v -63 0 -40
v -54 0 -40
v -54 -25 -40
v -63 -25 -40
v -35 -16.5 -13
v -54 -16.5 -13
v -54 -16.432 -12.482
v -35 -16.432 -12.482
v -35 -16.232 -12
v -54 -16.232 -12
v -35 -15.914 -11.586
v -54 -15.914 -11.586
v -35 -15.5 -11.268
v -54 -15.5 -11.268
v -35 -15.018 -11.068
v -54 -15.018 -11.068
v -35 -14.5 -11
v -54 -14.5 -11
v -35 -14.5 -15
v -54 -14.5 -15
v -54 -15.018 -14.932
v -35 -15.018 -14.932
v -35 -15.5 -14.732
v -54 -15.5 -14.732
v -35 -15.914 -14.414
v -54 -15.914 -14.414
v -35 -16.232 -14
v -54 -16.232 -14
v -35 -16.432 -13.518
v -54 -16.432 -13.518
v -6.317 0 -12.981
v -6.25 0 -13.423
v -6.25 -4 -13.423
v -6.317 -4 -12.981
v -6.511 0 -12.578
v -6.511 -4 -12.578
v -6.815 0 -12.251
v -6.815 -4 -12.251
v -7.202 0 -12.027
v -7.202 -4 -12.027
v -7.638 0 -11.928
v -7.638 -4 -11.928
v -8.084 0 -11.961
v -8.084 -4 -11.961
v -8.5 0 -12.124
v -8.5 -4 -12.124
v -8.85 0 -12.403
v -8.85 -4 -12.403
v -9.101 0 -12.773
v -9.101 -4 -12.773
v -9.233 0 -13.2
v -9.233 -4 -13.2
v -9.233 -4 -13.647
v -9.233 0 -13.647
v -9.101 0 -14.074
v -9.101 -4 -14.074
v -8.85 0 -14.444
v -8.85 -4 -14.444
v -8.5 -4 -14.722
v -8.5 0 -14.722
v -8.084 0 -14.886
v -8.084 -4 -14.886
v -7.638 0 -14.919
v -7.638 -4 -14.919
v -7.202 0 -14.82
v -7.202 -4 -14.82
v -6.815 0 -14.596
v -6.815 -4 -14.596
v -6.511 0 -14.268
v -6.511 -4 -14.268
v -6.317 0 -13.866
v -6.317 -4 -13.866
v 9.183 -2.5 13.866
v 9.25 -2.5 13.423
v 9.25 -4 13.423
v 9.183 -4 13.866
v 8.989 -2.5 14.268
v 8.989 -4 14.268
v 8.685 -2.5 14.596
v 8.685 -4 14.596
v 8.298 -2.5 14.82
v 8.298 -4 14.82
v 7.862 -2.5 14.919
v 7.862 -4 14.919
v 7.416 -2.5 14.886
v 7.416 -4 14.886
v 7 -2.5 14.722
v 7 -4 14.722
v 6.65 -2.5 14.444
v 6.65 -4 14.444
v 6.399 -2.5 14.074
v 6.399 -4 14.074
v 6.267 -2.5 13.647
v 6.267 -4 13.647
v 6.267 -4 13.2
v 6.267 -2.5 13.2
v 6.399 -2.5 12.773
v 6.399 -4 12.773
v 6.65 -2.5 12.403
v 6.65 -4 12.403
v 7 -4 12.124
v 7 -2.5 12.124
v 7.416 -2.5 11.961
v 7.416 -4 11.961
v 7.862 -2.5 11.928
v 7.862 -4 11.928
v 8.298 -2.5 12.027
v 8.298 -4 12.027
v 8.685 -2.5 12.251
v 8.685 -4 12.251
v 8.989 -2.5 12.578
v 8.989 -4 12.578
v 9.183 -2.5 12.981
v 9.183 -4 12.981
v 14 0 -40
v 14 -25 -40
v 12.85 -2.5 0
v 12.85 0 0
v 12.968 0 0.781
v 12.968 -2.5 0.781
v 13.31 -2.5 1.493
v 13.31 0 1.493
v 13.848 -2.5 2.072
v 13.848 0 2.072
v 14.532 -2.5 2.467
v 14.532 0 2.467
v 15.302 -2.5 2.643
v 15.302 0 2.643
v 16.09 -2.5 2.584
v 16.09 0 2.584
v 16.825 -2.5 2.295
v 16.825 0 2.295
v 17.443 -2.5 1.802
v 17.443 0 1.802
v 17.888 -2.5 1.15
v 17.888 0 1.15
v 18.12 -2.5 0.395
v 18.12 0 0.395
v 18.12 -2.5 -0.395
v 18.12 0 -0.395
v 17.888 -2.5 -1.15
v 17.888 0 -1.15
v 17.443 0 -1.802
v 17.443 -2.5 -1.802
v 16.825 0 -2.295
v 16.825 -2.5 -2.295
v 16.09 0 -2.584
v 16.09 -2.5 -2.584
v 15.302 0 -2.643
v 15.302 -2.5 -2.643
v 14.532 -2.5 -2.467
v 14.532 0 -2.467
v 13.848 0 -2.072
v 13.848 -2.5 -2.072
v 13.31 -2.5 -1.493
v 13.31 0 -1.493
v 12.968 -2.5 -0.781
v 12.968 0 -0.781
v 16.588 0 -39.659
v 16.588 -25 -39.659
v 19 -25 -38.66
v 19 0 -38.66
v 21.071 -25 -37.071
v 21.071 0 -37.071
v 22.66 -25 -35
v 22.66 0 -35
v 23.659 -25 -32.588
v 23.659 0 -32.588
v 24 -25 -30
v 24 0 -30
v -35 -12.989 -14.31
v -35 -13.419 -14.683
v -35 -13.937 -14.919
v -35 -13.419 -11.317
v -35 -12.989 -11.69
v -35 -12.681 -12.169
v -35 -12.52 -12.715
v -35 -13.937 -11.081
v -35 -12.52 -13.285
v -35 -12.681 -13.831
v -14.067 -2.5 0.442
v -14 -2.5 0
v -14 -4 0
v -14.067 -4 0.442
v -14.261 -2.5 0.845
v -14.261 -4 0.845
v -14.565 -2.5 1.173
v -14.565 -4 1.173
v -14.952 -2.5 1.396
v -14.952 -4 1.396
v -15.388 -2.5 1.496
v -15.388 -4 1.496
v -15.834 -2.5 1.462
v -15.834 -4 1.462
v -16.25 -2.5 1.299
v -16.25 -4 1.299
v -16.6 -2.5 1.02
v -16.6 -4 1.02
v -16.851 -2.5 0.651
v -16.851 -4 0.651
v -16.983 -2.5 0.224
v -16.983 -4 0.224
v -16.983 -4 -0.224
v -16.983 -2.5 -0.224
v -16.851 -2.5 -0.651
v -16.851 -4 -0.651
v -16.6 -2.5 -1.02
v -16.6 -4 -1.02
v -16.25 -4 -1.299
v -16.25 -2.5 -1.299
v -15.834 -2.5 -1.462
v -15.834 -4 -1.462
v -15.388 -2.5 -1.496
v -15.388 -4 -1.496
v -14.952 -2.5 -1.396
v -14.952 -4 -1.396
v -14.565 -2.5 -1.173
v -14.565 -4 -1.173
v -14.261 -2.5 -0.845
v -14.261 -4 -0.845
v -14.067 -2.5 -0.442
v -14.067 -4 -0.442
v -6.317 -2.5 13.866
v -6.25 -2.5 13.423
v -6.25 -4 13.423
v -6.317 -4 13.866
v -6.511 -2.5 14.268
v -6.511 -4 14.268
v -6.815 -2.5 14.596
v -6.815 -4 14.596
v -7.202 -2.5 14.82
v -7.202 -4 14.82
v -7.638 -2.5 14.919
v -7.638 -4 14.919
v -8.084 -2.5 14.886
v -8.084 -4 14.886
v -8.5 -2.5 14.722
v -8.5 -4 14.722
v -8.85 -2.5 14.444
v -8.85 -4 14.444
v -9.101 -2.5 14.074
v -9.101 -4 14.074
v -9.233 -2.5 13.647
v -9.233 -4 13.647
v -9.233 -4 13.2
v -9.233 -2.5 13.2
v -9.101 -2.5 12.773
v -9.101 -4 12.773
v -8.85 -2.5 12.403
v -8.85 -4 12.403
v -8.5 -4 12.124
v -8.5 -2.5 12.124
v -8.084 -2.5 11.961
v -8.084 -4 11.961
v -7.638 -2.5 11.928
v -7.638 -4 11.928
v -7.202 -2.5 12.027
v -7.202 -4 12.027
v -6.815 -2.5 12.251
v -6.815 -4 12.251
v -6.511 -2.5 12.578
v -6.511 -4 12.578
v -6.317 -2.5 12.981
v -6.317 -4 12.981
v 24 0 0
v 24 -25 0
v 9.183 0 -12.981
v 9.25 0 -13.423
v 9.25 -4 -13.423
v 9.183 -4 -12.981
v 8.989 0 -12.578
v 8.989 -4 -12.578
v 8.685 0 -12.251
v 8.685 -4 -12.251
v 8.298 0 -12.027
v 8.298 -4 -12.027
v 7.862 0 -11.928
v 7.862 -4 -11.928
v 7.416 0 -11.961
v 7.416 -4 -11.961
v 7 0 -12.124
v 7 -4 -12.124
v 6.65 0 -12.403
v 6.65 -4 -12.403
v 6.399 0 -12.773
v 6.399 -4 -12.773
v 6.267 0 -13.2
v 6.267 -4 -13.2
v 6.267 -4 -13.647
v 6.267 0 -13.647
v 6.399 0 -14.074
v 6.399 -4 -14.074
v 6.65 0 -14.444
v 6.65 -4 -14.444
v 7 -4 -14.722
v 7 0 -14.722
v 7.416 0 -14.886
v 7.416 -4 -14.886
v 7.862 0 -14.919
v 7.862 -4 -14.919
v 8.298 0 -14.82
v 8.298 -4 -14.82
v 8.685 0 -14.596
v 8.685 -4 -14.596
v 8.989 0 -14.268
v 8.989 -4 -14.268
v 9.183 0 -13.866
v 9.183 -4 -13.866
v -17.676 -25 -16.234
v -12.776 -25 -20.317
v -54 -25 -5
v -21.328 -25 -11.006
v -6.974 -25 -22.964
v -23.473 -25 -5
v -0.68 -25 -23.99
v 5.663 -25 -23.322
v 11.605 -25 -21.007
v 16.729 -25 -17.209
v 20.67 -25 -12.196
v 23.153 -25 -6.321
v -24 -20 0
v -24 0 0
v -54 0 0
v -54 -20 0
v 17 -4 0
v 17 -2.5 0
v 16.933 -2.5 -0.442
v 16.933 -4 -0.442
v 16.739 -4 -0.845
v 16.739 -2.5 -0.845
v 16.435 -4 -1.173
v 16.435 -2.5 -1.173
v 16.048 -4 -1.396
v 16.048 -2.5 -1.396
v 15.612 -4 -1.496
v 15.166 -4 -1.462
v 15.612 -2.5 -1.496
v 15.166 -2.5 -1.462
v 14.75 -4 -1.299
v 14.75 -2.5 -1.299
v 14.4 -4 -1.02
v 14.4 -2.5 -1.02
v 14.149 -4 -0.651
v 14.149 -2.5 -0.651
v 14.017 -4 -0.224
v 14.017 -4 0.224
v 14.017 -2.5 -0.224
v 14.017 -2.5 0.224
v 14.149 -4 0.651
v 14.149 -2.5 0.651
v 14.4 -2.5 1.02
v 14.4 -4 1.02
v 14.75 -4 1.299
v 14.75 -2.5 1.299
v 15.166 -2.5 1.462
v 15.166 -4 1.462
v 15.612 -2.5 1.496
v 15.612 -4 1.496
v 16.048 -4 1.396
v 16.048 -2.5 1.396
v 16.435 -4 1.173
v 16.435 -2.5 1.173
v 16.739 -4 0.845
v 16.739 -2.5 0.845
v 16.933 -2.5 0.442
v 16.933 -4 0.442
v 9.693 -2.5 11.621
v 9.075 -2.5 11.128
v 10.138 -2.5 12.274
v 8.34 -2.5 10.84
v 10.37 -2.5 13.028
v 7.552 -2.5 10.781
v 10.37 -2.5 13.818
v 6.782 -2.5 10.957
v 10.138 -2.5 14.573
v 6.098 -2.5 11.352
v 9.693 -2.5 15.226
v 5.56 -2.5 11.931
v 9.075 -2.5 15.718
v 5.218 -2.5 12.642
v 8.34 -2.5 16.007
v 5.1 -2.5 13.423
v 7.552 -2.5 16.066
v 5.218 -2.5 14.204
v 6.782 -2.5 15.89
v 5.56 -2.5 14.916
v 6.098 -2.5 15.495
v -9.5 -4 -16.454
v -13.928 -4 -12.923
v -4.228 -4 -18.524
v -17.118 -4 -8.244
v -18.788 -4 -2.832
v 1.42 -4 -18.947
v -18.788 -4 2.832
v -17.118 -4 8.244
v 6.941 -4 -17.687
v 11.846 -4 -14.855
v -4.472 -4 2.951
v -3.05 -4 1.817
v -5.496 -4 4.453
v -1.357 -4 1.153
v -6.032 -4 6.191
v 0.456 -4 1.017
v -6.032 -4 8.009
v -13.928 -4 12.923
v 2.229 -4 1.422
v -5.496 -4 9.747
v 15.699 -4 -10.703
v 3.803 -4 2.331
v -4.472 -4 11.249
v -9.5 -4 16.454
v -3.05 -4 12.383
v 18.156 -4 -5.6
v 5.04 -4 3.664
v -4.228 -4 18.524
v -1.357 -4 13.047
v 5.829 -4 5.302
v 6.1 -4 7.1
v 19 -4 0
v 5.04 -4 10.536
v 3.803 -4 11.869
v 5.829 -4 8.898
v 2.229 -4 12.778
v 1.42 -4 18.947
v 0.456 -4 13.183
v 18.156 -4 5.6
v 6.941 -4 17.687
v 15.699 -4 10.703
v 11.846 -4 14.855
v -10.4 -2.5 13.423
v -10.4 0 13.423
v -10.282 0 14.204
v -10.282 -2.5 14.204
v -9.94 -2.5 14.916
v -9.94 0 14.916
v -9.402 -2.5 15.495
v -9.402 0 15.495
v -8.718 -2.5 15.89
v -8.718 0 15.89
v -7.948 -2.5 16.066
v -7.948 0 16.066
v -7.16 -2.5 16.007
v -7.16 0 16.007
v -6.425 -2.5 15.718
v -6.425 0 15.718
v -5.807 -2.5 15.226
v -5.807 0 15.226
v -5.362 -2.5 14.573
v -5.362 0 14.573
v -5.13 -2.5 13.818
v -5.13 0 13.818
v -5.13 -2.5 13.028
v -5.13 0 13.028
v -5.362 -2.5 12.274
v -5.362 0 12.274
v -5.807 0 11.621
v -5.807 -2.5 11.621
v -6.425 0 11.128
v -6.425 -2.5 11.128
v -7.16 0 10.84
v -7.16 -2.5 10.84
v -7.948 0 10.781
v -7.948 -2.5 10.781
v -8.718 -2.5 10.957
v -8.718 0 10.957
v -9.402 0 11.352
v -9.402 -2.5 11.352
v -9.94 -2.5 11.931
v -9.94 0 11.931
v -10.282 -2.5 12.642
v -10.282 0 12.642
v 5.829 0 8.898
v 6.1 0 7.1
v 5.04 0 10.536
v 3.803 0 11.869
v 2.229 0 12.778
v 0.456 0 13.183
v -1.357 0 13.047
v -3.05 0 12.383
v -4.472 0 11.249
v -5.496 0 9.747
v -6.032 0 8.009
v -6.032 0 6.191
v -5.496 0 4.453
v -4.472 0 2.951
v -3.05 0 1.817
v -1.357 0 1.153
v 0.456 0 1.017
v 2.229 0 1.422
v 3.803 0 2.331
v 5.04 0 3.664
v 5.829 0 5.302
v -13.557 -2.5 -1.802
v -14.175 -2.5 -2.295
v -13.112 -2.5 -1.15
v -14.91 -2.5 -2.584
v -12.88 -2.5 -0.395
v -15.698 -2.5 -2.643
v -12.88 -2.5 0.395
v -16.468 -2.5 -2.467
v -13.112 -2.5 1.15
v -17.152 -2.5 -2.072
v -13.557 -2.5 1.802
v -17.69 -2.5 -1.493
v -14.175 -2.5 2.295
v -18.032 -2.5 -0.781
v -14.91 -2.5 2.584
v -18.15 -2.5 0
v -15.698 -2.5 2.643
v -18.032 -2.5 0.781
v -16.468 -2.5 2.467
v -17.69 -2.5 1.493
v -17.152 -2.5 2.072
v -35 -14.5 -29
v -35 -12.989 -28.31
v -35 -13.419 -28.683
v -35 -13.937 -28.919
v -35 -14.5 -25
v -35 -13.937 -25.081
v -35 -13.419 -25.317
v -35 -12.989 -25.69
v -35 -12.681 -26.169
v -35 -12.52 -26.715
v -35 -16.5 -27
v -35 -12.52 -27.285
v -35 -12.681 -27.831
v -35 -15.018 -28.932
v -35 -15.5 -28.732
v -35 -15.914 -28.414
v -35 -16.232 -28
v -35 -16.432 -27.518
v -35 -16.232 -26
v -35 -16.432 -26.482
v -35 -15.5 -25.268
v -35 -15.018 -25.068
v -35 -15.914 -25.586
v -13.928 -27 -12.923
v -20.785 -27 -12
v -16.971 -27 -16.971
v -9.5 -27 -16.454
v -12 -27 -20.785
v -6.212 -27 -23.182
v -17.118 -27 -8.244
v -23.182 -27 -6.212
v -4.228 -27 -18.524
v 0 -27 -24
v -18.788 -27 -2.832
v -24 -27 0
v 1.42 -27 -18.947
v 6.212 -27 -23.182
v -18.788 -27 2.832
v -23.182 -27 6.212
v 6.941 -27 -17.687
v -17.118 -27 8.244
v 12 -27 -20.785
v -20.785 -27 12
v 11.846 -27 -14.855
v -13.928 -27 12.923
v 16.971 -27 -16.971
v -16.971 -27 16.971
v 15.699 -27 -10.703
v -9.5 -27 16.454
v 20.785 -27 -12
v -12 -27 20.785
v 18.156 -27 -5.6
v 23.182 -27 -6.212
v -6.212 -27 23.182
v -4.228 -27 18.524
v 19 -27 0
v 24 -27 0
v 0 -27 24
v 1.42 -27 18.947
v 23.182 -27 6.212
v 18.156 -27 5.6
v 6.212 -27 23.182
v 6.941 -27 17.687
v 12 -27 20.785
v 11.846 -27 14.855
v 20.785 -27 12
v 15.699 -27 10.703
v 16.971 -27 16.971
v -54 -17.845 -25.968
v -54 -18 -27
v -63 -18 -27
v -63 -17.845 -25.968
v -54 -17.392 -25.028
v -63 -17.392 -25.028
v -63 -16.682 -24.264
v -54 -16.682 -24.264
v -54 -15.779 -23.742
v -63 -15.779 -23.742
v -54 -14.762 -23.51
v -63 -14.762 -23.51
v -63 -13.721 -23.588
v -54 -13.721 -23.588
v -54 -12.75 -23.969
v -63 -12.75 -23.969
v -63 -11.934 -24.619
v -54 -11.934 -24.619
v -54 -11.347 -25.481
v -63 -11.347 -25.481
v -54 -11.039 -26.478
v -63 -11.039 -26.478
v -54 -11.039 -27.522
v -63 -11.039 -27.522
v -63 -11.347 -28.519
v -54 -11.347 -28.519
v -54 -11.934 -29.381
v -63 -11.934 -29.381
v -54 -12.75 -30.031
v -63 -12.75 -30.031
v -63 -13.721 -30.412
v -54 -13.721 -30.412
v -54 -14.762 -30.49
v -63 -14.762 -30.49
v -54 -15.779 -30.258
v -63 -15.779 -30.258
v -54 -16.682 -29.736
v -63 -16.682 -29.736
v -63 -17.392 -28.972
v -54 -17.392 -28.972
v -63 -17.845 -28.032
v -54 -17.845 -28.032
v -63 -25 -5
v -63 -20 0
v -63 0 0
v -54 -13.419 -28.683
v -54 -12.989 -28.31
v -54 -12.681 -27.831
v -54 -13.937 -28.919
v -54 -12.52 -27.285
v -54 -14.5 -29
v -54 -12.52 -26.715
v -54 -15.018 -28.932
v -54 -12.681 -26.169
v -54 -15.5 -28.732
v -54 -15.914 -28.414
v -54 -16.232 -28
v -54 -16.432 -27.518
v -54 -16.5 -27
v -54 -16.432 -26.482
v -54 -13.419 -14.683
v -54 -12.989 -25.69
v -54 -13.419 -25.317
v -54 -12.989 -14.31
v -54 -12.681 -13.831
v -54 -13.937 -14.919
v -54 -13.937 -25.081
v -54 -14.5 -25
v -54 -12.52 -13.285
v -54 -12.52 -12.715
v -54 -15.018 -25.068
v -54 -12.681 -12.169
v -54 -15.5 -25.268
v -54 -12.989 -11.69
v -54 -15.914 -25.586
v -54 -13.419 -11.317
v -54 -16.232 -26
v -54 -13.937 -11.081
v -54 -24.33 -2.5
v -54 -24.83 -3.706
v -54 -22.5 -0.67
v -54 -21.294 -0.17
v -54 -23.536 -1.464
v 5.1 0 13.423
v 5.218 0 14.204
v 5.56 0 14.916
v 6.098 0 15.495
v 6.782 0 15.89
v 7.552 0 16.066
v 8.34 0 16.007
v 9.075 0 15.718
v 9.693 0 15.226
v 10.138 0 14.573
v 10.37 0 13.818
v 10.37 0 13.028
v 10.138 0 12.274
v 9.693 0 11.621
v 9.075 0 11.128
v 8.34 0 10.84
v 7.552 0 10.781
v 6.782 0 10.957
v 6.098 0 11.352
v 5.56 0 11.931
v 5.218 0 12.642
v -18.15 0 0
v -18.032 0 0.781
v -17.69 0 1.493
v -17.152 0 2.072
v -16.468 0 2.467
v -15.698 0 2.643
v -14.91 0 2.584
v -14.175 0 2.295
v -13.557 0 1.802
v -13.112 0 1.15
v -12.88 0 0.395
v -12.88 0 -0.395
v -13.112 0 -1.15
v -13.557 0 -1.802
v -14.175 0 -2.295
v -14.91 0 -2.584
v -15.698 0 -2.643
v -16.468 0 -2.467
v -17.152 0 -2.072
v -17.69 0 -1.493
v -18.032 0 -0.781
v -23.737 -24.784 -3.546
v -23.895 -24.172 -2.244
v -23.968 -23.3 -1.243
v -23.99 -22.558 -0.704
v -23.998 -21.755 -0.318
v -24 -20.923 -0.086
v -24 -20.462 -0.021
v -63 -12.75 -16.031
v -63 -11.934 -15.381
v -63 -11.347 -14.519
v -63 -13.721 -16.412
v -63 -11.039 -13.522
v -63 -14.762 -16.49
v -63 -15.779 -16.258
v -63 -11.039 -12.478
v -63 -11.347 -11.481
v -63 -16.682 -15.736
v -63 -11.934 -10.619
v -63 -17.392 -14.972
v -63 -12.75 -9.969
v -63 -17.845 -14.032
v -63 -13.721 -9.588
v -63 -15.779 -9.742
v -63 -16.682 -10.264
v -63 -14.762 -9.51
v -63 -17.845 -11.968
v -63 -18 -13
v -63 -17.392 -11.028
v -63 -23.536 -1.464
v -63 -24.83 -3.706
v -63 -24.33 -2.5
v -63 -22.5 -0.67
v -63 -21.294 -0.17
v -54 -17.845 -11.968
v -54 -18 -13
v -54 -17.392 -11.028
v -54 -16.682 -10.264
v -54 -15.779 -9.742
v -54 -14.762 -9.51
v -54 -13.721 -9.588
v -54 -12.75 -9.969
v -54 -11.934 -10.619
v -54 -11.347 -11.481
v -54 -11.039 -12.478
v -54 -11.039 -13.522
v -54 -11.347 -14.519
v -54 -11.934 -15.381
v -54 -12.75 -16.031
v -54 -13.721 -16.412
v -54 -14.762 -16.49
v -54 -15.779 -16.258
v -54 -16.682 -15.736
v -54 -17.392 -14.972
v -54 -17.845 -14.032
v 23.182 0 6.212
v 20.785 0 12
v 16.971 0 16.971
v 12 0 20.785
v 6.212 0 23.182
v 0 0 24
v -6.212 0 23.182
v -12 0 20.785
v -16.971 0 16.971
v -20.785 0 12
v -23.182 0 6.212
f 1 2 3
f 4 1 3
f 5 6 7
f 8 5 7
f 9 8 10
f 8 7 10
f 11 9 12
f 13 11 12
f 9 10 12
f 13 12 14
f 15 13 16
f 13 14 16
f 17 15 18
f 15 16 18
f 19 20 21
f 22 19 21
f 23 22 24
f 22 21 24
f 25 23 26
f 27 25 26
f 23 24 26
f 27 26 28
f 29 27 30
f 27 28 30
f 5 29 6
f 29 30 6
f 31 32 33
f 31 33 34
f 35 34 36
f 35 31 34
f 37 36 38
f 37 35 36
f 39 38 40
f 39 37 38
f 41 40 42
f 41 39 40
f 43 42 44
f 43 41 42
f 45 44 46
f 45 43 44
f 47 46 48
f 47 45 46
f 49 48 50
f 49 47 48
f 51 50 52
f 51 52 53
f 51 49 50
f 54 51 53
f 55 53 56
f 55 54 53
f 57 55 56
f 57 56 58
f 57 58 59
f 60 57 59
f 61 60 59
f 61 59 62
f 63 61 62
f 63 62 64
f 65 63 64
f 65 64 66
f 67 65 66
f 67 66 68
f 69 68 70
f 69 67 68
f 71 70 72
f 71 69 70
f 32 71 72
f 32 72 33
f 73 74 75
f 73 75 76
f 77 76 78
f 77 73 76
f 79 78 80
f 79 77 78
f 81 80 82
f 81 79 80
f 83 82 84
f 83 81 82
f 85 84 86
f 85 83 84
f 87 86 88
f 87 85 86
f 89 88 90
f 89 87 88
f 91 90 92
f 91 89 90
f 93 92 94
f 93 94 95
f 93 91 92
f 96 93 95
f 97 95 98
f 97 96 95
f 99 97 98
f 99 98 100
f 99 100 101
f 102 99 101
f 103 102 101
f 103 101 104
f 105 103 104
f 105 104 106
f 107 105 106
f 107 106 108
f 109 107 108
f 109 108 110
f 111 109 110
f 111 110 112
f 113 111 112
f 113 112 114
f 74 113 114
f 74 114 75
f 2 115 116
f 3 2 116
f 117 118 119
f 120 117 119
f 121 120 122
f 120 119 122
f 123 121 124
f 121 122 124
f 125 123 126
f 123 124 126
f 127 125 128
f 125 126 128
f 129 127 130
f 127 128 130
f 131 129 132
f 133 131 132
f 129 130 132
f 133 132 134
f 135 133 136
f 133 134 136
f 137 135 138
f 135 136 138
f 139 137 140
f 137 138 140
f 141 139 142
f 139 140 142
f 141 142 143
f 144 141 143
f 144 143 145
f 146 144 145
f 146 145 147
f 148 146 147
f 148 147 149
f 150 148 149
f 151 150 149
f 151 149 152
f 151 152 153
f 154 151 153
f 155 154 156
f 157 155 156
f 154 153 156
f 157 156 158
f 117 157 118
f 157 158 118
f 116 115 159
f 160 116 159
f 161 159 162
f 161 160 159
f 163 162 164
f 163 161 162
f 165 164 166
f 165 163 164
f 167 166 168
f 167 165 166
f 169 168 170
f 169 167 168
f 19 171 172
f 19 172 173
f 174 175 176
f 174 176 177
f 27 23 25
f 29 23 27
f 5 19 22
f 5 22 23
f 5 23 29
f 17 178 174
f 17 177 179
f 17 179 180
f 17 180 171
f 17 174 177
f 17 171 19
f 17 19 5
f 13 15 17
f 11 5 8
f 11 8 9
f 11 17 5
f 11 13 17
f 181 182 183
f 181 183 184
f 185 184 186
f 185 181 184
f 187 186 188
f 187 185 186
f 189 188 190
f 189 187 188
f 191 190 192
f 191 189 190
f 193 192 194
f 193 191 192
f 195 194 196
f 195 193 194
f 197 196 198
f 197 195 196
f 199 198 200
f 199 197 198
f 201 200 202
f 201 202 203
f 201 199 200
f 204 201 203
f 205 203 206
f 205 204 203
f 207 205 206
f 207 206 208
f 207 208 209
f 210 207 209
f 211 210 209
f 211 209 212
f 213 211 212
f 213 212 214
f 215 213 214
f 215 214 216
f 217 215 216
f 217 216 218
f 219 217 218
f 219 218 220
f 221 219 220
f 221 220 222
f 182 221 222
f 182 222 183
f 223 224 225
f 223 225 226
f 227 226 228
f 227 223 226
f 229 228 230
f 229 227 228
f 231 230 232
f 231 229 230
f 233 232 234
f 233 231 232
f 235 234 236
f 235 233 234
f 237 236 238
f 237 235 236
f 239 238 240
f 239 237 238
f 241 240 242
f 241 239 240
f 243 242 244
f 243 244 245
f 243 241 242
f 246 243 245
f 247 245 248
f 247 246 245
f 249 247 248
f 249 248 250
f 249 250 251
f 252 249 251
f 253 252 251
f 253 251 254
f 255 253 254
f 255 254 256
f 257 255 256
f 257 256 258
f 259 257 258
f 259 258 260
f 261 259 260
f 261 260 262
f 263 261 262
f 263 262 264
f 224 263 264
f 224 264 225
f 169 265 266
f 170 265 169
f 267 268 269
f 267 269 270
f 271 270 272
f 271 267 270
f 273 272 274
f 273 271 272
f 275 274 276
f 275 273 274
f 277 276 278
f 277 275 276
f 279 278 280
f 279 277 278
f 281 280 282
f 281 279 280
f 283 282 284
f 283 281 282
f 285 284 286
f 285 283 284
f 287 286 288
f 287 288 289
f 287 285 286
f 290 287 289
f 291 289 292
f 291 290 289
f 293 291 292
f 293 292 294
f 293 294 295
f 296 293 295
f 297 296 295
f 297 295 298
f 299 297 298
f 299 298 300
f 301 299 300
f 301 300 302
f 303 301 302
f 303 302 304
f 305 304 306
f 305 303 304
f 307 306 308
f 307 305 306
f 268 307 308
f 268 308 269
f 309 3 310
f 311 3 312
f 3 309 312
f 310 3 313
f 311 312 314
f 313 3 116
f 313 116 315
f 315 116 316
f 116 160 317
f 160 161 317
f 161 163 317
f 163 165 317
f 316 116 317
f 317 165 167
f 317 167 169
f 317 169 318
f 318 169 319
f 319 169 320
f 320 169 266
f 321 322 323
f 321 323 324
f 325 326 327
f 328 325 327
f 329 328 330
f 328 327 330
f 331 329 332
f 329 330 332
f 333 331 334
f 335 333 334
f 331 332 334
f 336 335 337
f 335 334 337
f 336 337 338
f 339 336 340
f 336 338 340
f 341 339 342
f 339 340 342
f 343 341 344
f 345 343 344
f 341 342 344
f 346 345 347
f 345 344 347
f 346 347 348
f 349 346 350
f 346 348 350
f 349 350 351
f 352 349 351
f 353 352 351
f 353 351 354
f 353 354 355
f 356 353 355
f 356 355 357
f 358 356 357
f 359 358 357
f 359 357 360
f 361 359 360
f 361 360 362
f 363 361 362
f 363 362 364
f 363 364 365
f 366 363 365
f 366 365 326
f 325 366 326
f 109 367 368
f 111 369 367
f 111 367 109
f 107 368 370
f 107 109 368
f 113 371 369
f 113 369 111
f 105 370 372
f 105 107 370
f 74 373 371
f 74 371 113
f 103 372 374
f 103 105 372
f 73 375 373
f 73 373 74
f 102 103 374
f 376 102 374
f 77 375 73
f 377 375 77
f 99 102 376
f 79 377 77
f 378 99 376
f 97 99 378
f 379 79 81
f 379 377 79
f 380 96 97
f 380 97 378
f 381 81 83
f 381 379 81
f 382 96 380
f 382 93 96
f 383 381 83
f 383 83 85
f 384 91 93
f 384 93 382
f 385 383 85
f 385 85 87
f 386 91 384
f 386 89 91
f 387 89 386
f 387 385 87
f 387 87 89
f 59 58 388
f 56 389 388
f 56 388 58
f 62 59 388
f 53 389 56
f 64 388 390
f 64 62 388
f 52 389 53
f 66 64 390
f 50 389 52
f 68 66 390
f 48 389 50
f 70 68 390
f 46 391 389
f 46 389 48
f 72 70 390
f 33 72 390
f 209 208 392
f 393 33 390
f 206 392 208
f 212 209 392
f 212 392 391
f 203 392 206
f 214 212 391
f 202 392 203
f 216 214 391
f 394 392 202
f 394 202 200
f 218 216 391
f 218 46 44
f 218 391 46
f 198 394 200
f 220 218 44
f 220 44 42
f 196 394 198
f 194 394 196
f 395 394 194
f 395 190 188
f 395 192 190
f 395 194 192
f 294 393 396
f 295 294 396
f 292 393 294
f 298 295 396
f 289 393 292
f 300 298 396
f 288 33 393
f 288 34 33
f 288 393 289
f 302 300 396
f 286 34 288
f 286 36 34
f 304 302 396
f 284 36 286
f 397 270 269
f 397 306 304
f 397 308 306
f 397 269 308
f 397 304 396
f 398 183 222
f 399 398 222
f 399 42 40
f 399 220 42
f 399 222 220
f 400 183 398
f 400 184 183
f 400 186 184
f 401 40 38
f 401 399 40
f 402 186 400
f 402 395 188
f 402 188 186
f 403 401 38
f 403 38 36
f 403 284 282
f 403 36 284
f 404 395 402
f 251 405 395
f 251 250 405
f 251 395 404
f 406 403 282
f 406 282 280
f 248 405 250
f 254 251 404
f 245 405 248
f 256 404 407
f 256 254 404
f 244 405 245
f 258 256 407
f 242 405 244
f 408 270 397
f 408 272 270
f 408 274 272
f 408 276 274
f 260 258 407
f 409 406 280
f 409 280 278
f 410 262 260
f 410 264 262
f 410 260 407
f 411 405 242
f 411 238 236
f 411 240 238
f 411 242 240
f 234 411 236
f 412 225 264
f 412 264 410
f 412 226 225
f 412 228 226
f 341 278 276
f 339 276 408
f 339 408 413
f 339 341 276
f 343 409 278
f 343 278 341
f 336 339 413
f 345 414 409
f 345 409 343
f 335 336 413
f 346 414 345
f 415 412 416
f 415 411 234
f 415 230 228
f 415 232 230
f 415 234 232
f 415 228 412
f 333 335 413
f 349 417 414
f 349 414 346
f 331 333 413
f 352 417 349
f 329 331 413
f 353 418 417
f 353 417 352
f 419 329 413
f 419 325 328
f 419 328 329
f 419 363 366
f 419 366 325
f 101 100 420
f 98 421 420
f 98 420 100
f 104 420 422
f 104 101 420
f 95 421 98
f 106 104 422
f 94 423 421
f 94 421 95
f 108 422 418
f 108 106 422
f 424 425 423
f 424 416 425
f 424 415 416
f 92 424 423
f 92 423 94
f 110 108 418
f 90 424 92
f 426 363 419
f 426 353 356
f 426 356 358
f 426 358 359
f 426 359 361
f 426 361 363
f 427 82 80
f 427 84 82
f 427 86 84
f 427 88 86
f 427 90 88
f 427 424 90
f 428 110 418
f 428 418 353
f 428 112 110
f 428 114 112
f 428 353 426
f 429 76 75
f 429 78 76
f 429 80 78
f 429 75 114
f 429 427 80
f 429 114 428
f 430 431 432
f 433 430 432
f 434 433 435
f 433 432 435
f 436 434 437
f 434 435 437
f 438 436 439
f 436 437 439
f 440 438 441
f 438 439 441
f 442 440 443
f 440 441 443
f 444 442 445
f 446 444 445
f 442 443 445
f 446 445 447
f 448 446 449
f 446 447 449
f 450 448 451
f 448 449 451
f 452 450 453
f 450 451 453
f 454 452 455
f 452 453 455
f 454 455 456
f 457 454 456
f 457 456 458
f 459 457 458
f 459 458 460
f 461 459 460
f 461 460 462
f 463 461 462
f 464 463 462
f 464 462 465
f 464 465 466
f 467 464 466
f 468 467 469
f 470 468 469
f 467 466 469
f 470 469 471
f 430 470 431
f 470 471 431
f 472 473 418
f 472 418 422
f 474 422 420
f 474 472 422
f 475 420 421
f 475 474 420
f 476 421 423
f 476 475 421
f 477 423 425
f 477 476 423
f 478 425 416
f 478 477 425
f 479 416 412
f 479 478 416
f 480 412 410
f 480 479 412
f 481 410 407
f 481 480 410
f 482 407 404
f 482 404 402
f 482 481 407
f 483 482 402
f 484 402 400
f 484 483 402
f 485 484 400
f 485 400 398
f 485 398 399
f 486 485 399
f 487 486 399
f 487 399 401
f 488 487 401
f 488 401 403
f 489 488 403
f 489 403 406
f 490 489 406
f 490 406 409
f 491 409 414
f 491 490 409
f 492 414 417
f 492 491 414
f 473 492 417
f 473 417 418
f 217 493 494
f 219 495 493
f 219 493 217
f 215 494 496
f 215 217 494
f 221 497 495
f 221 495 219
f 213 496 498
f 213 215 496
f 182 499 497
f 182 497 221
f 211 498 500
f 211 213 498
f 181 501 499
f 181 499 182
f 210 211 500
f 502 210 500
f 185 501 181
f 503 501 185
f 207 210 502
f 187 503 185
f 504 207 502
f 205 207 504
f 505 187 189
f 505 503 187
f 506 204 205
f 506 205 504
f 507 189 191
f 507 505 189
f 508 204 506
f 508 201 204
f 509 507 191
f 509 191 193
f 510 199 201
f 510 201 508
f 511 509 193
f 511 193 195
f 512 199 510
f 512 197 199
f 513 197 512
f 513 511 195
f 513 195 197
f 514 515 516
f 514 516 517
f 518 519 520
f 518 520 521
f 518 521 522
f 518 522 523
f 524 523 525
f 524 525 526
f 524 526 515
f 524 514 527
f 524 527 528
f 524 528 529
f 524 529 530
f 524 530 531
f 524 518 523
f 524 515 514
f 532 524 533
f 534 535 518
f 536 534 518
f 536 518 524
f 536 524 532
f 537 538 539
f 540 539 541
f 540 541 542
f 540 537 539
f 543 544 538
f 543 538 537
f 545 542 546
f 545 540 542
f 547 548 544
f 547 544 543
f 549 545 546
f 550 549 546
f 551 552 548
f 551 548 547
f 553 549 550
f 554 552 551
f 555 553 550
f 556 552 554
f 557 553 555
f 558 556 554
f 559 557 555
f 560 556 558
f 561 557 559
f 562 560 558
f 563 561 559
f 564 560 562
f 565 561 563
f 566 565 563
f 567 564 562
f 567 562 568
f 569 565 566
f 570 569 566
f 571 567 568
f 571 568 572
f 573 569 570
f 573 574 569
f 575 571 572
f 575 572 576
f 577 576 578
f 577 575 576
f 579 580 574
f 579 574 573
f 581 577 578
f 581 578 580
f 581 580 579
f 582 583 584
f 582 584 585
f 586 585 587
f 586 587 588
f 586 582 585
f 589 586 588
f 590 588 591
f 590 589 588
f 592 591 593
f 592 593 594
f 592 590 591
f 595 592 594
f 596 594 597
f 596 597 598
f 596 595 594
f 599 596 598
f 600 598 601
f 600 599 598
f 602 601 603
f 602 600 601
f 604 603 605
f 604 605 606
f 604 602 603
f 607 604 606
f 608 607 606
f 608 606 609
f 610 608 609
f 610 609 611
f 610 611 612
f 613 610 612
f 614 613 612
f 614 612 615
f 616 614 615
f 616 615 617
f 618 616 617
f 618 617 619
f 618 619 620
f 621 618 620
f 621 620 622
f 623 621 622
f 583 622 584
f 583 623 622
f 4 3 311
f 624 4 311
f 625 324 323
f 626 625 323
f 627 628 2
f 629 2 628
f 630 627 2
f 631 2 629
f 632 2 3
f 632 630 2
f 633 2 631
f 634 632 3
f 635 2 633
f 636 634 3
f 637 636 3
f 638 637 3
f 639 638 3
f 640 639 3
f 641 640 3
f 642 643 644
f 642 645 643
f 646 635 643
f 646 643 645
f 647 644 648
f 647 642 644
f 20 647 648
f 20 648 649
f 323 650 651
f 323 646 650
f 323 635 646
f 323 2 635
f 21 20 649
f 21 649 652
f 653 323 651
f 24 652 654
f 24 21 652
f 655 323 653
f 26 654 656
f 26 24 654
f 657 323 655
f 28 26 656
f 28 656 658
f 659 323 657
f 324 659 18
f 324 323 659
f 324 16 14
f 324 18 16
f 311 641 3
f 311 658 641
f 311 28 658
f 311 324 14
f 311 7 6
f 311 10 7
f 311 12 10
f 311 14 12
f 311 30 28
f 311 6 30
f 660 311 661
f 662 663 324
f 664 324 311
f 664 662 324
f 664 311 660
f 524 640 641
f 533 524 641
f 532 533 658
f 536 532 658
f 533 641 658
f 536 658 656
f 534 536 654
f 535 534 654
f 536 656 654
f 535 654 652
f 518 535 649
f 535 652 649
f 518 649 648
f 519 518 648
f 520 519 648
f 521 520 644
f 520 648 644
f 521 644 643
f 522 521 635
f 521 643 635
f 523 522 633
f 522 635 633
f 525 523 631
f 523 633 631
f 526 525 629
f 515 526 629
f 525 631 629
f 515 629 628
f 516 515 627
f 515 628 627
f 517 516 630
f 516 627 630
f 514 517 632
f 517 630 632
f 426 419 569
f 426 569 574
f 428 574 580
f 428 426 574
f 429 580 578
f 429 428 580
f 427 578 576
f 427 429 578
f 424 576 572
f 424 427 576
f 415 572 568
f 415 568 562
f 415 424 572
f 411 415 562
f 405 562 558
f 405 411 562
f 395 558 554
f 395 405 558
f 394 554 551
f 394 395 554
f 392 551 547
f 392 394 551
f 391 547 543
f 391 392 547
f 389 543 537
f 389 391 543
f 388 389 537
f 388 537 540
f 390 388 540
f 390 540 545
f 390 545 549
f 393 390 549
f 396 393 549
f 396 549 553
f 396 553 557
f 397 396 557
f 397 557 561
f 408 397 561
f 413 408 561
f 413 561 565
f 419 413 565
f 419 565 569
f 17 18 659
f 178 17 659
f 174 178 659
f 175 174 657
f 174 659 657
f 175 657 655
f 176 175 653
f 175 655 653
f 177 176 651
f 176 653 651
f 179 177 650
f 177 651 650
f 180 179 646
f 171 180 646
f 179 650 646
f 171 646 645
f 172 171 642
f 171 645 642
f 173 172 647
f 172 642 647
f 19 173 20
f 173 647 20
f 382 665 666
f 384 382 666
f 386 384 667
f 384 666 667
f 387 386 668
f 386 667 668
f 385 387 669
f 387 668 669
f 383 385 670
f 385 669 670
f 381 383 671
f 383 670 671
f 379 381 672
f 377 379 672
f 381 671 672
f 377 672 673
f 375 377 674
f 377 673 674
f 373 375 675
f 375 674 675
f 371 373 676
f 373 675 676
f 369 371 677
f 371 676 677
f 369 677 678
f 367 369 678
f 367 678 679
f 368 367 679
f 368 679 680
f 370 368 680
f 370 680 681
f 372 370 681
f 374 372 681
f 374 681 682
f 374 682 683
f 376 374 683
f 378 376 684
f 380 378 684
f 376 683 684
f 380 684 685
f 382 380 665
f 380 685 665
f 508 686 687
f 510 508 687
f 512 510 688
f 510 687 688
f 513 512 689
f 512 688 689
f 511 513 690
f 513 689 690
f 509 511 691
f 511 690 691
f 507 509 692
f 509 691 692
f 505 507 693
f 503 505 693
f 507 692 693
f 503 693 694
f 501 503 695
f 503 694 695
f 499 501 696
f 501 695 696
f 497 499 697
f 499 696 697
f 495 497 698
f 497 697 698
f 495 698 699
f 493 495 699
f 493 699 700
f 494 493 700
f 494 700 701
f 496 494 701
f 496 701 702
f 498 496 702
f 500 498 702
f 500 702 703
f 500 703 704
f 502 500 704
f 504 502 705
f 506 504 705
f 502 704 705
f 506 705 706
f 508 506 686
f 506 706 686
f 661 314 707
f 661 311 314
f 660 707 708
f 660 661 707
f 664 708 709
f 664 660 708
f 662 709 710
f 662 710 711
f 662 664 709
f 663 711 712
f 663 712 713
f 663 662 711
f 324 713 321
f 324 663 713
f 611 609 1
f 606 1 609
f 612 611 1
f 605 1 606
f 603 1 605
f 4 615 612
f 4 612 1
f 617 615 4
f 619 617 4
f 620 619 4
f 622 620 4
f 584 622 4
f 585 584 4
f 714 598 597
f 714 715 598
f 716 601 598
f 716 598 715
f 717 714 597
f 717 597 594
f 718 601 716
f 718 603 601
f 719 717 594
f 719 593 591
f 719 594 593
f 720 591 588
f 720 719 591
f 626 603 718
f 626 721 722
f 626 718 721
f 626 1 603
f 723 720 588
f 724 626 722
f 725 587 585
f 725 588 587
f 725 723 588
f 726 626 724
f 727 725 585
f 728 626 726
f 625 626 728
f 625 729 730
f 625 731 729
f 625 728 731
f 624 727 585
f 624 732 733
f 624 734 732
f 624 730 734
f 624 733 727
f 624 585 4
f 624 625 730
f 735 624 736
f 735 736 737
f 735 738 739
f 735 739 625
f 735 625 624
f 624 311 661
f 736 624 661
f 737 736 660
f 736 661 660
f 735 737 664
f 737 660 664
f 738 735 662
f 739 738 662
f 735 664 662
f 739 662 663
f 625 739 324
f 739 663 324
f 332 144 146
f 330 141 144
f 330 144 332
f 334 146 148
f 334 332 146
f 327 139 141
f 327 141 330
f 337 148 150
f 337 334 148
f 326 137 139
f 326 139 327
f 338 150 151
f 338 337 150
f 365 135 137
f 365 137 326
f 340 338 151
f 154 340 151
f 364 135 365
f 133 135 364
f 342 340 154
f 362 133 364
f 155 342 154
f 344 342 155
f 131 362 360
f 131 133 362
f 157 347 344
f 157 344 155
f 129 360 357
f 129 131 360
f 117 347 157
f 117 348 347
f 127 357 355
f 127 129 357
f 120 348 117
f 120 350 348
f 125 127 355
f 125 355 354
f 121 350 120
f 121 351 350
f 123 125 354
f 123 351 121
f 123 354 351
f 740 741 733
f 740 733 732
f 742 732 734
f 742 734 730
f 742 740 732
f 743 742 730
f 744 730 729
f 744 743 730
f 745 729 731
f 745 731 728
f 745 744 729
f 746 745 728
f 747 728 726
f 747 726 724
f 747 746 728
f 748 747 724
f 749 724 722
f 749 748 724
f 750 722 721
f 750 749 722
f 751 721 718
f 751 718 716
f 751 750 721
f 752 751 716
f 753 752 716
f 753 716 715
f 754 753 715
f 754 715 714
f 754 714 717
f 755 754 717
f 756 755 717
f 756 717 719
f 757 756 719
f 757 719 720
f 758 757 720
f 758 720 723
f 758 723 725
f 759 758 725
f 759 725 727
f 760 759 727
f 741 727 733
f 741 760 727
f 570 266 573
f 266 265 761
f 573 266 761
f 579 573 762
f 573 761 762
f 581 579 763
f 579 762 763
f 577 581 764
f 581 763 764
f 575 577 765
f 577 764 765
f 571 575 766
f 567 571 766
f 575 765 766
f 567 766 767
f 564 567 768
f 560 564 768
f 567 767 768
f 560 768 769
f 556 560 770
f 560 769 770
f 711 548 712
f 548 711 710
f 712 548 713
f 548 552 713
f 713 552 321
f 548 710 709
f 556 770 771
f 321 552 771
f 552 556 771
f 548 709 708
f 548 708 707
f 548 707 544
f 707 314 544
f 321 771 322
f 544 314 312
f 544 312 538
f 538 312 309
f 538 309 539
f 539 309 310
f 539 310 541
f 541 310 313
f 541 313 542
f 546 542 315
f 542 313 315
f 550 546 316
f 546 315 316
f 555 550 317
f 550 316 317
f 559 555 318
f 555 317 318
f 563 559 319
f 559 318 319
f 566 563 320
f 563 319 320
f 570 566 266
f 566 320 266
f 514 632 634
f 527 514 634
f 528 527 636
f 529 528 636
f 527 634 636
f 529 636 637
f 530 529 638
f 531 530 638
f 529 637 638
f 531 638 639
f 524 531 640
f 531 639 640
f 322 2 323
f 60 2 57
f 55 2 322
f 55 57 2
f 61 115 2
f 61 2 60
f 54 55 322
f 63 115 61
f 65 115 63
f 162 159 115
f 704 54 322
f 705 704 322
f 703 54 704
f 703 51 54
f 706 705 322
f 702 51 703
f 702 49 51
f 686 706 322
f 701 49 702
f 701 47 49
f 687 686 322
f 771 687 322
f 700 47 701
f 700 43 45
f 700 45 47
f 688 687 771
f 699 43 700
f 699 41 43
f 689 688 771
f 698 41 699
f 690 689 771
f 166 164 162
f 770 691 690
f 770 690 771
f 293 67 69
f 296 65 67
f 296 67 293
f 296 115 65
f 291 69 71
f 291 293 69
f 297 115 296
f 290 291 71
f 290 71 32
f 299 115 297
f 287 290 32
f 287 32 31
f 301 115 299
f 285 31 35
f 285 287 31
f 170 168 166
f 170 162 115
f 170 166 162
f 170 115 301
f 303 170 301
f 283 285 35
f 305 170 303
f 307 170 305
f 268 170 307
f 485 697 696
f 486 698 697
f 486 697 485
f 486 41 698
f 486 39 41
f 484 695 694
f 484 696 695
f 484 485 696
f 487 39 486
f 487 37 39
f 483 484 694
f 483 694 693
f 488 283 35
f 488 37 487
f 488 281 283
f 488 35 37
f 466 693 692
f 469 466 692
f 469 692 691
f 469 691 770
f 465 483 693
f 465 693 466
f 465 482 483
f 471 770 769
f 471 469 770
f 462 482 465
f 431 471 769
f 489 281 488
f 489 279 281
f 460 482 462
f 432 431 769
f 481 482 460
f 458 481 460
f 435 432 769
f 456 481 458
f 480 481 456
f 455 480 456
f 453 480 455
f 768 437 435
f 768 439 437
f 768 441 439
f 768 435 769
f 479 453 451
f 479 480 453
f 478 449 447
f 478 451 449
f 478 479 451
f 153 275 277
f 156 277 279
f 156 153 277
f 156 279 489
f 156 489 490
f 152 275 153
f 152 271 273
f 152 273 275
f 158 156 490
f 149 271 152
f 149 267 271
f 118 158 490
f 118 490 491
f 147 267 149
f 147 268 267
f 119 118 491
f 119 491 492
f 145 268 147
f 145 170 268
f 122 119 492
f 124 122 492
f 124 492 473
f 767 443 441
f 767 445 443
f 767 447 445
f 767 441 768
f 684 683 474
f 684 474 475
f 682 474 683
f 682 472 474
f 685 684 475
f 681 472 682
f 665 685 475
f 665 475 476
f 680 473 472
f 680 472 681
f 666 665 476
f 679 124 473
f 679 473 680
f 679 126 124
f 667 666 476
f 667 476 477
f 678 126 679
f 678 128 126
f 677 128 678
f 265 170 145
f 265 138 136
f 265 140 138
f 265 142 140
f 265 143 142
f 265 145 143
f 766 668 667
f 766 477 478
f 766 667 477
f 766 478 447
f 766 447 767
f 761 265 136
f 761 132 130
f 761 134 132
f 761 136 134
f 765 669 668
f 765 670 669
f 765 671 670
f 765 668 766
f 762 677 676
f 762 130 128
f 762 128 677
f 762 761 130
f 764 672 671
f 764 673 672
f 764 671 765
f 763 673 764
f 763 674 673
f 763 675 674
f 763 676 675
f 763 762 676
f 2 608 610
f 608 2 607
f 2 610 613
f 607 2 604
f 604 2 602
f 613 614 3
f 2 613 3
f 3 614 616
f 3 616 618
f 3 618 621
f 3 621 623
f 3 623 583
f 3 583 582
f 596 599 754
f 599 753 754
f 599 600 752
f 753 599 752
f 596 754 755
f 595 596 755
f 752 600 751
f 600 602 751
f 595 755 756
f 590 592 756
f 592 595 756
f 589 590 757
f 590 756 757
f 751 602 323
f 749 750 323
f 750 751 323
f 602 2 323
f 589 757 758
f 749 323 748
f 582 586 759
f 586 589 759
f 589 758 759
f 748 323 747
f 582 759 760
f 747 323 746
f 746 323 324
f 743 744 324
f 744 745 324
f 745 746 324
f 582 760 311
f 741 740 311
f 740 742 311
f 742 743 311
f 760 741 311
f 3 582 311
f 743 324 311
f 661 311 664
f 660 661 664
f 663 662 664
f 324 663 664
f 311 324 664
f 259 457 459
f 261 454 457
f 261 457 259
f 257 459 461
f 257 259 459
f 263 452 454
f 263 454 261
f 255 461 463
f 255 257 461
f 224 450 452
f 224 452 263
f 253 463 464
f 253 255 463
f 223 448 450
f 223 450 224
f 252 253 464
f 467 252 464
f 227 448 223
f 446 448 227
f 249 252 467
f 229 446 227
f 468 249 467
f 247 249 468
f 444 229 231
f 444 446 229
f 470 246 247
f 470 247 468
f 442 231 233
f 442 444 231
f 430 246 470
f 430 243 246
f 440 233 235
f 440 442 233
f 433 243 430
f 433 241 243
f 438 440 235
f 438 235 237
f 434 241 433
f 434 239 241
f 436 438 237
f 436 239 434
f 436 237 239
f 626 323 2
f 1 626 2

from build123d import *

# Parameters (mm, degrees)
F0_R      = 19
F0_R_2    = 1.5
F0_R_3    = 6.1
F1_DEPTH  = 4
F2_R      = 24
F2_R_2    = 19
F3_DEPTH  = 27
F5_DEPTH  = 25
F6_R      = 2.65
F7_DEPTH  = 2.5
F8_W      = 25
F8_H      = 40
F9_DEPTH  = 30
F10_R     = 5
F11_R     = 10
F13_DEPTH = 19
F14_R     = 3.5
F15_DEPTH = 9


with BuildPart() as f1:
    # F0 (on Front) → F1 (new body)
    with BuildSketch(Plane.XZ):
        Circle(F0_R)
        with Locations((-7.75, -13.4233937587)):
            Circle(F0_R_2, mode=Mode.SUBTRACT)
        with Locations((7.75, -13.4233937587)):
            Circle(F0_R_2, mode=Mode.SUBTRACT)
        with Locations((-15.5, 0)):
            Circle(F0_R_2, mode=Mode.SUBTRACT)
        with Locations((-7.75, 13.4233937587)):
            Circle(F0_R_2, mode=Mode.SUBTRACT)
        with Locations((0, 7.1)):
            Circle(F0_R_3, mode=Mode.SUBTRACT)
        with BuildLine():
            ThreePointArc((14, 0), (15.5, 1.5), (17, 0))
            ThreePointArc((17, 0), (15.5, -1.5), (14, 0))
        make_face(mode=Mode.SUBTRACT)
        with Locations((7.75, 13.4233937587)):
            Circle(F0_R_2, mode=Mode.SUBTRACT)
    extrude(amount=F1_DEPTH)

    # F2 (on Front) → F3 (join)
    with BuildSketch(Plane.XZ):
        Circle(F2_R)
        Circle(F2_R_2, mode=Mode.SUBTRACT)
    extrude(amount=F3_DEPTH)

    # F4 (on face) → F5 (join)
    with BuildSketch(Plane(origin=(0, 0, 0), x_dir=(-1, 0, 0), z_dir=(0, 1, 0))):
        with BuildLine():
            Line((24, -40), (24, 0))
            ThreePointArc((24, 0), (0, -24), (-24, 0))
            Line((-24, 0), (-24, -40))
            Line((-24, -40), (0, -40))
            Line((0, -40), (24, -40))
        make_face()
    extrude(amount=-F5_DEPTH)

    # F6 (on face) → F7 (cut)
    with BuildSketch(Plane(origin=(0, 0, 0), x_dir=(-1, 0, 0), z_dir=(0, 1, 0))):
        with Locations((-7.75, 13.4233937587)):
            Circle(F6_R)
        with Locations((7.75, 13.4233937587)):
            Circle(F6_R)
        with Locations((-15.5, 0)):
            Circle(F6_R)
        with Locations((15.5, 0)):
            Circle(F6_R)
    extrude(amount=-F7_DEPTH, mode=Mode.SUBTRACT)

    # F8 (on face) → F9 (join)
    with BuildSketch(Plane(origin=(-24, 0, 0), x_dir=(0, -1, 0), z_dir=(-1, 0, 0))):
        with Locations((12.5, -20)):
            Rectangle(F8_W, F8_H)
    extrude(amount=F9_DEPTH)

    # F10
    f10_edges = [f1.edges().sort_by_distance(p)[0] for p in [
        (-39, -25, 0),
    ]]
    fillet(f10_edges, radius=F10_R)

    # F11
    f11_edges = [f1.edges().sort_by_distance(p)[0] for p in [
        (24, -12.5, -40),
    ]]
    fillet(f11_edges, radius=F11_R)

    # F12 (on face) → F13 (cut)
    with BuildSketch(Plane(origin=(-54, 0, 0), x_dir=(0, -1, 0), z_dir=(-1, 0, 0))):
        with BuildLine():
            ThreePointArc((14.5, -25), (12.5, -27), (14.5, -29))
            Line((14.5, -29), (14.5, -27))
            Line((14.5, -27), (14.5, -25))
        make_face()
        with BuildLine():
            ThreePointArc((14.5, -11), (12.5, -13), (14.5, -15))
            Line((14.5, -15), (14.5, -13))
            Line((14.5, -13), (14.5, -11))
        make_face()
        with BuildLine():
            Line((14.5, -13), (14.5, -15))
            ThreePointArc((14.5, -15), (15.9142135624, -14.4142135624), (16.5, -13))
            ThreePointArc((16.5, -13), (15.9142135624, -11.5857864376), (14.5, -11))
            Line((14.5, -11), (14.5, -13))
        make_face()
        with BuildLine():
            Line((14.5, -27), (14.5, -29))
            ThreePointArc((14.5, -29), (15.9142135624, -28.4142135624), (16.5, -27))
            ThreePointArc((16.5, -27), (15.9142135624, -25.5857864376), (14.5, -25))
            Line((14.5, -25), (14.5, -27))
        make_face()
    extrude(amount=-F13_DEPTH, mode=Mode.SUBTRACT)


with BuildPart() as f15:
    # F14 (on face) → F15 (new body)
    with BuildSketch(Plane(origin=(-54, 0, 0), x_dir=(0, -1, 0), z_dir=(-1, 0, 0))):
        with BuildLine():
            Line((20, 0), (0, 0))
            Line((0, 0), (0, -40))
            Line((0, -40), (25, -40))
            Line((25, -40), (25, -5))
            ThreePointArc((25, -5), (23.5355339059, -1.4644660941), (20, 0))
        make_face()
        with Locations((14.5, -27)):
            Circle(F14_R, mode=Mode.SUBTRACT)
        with Locations((14.5, -13)):
            Circle(F14_R, mode=Mode.SUBTRACT)
    extrude(amount=F15_DEPTH)


solid = Compound([f1.part, f15.part])
